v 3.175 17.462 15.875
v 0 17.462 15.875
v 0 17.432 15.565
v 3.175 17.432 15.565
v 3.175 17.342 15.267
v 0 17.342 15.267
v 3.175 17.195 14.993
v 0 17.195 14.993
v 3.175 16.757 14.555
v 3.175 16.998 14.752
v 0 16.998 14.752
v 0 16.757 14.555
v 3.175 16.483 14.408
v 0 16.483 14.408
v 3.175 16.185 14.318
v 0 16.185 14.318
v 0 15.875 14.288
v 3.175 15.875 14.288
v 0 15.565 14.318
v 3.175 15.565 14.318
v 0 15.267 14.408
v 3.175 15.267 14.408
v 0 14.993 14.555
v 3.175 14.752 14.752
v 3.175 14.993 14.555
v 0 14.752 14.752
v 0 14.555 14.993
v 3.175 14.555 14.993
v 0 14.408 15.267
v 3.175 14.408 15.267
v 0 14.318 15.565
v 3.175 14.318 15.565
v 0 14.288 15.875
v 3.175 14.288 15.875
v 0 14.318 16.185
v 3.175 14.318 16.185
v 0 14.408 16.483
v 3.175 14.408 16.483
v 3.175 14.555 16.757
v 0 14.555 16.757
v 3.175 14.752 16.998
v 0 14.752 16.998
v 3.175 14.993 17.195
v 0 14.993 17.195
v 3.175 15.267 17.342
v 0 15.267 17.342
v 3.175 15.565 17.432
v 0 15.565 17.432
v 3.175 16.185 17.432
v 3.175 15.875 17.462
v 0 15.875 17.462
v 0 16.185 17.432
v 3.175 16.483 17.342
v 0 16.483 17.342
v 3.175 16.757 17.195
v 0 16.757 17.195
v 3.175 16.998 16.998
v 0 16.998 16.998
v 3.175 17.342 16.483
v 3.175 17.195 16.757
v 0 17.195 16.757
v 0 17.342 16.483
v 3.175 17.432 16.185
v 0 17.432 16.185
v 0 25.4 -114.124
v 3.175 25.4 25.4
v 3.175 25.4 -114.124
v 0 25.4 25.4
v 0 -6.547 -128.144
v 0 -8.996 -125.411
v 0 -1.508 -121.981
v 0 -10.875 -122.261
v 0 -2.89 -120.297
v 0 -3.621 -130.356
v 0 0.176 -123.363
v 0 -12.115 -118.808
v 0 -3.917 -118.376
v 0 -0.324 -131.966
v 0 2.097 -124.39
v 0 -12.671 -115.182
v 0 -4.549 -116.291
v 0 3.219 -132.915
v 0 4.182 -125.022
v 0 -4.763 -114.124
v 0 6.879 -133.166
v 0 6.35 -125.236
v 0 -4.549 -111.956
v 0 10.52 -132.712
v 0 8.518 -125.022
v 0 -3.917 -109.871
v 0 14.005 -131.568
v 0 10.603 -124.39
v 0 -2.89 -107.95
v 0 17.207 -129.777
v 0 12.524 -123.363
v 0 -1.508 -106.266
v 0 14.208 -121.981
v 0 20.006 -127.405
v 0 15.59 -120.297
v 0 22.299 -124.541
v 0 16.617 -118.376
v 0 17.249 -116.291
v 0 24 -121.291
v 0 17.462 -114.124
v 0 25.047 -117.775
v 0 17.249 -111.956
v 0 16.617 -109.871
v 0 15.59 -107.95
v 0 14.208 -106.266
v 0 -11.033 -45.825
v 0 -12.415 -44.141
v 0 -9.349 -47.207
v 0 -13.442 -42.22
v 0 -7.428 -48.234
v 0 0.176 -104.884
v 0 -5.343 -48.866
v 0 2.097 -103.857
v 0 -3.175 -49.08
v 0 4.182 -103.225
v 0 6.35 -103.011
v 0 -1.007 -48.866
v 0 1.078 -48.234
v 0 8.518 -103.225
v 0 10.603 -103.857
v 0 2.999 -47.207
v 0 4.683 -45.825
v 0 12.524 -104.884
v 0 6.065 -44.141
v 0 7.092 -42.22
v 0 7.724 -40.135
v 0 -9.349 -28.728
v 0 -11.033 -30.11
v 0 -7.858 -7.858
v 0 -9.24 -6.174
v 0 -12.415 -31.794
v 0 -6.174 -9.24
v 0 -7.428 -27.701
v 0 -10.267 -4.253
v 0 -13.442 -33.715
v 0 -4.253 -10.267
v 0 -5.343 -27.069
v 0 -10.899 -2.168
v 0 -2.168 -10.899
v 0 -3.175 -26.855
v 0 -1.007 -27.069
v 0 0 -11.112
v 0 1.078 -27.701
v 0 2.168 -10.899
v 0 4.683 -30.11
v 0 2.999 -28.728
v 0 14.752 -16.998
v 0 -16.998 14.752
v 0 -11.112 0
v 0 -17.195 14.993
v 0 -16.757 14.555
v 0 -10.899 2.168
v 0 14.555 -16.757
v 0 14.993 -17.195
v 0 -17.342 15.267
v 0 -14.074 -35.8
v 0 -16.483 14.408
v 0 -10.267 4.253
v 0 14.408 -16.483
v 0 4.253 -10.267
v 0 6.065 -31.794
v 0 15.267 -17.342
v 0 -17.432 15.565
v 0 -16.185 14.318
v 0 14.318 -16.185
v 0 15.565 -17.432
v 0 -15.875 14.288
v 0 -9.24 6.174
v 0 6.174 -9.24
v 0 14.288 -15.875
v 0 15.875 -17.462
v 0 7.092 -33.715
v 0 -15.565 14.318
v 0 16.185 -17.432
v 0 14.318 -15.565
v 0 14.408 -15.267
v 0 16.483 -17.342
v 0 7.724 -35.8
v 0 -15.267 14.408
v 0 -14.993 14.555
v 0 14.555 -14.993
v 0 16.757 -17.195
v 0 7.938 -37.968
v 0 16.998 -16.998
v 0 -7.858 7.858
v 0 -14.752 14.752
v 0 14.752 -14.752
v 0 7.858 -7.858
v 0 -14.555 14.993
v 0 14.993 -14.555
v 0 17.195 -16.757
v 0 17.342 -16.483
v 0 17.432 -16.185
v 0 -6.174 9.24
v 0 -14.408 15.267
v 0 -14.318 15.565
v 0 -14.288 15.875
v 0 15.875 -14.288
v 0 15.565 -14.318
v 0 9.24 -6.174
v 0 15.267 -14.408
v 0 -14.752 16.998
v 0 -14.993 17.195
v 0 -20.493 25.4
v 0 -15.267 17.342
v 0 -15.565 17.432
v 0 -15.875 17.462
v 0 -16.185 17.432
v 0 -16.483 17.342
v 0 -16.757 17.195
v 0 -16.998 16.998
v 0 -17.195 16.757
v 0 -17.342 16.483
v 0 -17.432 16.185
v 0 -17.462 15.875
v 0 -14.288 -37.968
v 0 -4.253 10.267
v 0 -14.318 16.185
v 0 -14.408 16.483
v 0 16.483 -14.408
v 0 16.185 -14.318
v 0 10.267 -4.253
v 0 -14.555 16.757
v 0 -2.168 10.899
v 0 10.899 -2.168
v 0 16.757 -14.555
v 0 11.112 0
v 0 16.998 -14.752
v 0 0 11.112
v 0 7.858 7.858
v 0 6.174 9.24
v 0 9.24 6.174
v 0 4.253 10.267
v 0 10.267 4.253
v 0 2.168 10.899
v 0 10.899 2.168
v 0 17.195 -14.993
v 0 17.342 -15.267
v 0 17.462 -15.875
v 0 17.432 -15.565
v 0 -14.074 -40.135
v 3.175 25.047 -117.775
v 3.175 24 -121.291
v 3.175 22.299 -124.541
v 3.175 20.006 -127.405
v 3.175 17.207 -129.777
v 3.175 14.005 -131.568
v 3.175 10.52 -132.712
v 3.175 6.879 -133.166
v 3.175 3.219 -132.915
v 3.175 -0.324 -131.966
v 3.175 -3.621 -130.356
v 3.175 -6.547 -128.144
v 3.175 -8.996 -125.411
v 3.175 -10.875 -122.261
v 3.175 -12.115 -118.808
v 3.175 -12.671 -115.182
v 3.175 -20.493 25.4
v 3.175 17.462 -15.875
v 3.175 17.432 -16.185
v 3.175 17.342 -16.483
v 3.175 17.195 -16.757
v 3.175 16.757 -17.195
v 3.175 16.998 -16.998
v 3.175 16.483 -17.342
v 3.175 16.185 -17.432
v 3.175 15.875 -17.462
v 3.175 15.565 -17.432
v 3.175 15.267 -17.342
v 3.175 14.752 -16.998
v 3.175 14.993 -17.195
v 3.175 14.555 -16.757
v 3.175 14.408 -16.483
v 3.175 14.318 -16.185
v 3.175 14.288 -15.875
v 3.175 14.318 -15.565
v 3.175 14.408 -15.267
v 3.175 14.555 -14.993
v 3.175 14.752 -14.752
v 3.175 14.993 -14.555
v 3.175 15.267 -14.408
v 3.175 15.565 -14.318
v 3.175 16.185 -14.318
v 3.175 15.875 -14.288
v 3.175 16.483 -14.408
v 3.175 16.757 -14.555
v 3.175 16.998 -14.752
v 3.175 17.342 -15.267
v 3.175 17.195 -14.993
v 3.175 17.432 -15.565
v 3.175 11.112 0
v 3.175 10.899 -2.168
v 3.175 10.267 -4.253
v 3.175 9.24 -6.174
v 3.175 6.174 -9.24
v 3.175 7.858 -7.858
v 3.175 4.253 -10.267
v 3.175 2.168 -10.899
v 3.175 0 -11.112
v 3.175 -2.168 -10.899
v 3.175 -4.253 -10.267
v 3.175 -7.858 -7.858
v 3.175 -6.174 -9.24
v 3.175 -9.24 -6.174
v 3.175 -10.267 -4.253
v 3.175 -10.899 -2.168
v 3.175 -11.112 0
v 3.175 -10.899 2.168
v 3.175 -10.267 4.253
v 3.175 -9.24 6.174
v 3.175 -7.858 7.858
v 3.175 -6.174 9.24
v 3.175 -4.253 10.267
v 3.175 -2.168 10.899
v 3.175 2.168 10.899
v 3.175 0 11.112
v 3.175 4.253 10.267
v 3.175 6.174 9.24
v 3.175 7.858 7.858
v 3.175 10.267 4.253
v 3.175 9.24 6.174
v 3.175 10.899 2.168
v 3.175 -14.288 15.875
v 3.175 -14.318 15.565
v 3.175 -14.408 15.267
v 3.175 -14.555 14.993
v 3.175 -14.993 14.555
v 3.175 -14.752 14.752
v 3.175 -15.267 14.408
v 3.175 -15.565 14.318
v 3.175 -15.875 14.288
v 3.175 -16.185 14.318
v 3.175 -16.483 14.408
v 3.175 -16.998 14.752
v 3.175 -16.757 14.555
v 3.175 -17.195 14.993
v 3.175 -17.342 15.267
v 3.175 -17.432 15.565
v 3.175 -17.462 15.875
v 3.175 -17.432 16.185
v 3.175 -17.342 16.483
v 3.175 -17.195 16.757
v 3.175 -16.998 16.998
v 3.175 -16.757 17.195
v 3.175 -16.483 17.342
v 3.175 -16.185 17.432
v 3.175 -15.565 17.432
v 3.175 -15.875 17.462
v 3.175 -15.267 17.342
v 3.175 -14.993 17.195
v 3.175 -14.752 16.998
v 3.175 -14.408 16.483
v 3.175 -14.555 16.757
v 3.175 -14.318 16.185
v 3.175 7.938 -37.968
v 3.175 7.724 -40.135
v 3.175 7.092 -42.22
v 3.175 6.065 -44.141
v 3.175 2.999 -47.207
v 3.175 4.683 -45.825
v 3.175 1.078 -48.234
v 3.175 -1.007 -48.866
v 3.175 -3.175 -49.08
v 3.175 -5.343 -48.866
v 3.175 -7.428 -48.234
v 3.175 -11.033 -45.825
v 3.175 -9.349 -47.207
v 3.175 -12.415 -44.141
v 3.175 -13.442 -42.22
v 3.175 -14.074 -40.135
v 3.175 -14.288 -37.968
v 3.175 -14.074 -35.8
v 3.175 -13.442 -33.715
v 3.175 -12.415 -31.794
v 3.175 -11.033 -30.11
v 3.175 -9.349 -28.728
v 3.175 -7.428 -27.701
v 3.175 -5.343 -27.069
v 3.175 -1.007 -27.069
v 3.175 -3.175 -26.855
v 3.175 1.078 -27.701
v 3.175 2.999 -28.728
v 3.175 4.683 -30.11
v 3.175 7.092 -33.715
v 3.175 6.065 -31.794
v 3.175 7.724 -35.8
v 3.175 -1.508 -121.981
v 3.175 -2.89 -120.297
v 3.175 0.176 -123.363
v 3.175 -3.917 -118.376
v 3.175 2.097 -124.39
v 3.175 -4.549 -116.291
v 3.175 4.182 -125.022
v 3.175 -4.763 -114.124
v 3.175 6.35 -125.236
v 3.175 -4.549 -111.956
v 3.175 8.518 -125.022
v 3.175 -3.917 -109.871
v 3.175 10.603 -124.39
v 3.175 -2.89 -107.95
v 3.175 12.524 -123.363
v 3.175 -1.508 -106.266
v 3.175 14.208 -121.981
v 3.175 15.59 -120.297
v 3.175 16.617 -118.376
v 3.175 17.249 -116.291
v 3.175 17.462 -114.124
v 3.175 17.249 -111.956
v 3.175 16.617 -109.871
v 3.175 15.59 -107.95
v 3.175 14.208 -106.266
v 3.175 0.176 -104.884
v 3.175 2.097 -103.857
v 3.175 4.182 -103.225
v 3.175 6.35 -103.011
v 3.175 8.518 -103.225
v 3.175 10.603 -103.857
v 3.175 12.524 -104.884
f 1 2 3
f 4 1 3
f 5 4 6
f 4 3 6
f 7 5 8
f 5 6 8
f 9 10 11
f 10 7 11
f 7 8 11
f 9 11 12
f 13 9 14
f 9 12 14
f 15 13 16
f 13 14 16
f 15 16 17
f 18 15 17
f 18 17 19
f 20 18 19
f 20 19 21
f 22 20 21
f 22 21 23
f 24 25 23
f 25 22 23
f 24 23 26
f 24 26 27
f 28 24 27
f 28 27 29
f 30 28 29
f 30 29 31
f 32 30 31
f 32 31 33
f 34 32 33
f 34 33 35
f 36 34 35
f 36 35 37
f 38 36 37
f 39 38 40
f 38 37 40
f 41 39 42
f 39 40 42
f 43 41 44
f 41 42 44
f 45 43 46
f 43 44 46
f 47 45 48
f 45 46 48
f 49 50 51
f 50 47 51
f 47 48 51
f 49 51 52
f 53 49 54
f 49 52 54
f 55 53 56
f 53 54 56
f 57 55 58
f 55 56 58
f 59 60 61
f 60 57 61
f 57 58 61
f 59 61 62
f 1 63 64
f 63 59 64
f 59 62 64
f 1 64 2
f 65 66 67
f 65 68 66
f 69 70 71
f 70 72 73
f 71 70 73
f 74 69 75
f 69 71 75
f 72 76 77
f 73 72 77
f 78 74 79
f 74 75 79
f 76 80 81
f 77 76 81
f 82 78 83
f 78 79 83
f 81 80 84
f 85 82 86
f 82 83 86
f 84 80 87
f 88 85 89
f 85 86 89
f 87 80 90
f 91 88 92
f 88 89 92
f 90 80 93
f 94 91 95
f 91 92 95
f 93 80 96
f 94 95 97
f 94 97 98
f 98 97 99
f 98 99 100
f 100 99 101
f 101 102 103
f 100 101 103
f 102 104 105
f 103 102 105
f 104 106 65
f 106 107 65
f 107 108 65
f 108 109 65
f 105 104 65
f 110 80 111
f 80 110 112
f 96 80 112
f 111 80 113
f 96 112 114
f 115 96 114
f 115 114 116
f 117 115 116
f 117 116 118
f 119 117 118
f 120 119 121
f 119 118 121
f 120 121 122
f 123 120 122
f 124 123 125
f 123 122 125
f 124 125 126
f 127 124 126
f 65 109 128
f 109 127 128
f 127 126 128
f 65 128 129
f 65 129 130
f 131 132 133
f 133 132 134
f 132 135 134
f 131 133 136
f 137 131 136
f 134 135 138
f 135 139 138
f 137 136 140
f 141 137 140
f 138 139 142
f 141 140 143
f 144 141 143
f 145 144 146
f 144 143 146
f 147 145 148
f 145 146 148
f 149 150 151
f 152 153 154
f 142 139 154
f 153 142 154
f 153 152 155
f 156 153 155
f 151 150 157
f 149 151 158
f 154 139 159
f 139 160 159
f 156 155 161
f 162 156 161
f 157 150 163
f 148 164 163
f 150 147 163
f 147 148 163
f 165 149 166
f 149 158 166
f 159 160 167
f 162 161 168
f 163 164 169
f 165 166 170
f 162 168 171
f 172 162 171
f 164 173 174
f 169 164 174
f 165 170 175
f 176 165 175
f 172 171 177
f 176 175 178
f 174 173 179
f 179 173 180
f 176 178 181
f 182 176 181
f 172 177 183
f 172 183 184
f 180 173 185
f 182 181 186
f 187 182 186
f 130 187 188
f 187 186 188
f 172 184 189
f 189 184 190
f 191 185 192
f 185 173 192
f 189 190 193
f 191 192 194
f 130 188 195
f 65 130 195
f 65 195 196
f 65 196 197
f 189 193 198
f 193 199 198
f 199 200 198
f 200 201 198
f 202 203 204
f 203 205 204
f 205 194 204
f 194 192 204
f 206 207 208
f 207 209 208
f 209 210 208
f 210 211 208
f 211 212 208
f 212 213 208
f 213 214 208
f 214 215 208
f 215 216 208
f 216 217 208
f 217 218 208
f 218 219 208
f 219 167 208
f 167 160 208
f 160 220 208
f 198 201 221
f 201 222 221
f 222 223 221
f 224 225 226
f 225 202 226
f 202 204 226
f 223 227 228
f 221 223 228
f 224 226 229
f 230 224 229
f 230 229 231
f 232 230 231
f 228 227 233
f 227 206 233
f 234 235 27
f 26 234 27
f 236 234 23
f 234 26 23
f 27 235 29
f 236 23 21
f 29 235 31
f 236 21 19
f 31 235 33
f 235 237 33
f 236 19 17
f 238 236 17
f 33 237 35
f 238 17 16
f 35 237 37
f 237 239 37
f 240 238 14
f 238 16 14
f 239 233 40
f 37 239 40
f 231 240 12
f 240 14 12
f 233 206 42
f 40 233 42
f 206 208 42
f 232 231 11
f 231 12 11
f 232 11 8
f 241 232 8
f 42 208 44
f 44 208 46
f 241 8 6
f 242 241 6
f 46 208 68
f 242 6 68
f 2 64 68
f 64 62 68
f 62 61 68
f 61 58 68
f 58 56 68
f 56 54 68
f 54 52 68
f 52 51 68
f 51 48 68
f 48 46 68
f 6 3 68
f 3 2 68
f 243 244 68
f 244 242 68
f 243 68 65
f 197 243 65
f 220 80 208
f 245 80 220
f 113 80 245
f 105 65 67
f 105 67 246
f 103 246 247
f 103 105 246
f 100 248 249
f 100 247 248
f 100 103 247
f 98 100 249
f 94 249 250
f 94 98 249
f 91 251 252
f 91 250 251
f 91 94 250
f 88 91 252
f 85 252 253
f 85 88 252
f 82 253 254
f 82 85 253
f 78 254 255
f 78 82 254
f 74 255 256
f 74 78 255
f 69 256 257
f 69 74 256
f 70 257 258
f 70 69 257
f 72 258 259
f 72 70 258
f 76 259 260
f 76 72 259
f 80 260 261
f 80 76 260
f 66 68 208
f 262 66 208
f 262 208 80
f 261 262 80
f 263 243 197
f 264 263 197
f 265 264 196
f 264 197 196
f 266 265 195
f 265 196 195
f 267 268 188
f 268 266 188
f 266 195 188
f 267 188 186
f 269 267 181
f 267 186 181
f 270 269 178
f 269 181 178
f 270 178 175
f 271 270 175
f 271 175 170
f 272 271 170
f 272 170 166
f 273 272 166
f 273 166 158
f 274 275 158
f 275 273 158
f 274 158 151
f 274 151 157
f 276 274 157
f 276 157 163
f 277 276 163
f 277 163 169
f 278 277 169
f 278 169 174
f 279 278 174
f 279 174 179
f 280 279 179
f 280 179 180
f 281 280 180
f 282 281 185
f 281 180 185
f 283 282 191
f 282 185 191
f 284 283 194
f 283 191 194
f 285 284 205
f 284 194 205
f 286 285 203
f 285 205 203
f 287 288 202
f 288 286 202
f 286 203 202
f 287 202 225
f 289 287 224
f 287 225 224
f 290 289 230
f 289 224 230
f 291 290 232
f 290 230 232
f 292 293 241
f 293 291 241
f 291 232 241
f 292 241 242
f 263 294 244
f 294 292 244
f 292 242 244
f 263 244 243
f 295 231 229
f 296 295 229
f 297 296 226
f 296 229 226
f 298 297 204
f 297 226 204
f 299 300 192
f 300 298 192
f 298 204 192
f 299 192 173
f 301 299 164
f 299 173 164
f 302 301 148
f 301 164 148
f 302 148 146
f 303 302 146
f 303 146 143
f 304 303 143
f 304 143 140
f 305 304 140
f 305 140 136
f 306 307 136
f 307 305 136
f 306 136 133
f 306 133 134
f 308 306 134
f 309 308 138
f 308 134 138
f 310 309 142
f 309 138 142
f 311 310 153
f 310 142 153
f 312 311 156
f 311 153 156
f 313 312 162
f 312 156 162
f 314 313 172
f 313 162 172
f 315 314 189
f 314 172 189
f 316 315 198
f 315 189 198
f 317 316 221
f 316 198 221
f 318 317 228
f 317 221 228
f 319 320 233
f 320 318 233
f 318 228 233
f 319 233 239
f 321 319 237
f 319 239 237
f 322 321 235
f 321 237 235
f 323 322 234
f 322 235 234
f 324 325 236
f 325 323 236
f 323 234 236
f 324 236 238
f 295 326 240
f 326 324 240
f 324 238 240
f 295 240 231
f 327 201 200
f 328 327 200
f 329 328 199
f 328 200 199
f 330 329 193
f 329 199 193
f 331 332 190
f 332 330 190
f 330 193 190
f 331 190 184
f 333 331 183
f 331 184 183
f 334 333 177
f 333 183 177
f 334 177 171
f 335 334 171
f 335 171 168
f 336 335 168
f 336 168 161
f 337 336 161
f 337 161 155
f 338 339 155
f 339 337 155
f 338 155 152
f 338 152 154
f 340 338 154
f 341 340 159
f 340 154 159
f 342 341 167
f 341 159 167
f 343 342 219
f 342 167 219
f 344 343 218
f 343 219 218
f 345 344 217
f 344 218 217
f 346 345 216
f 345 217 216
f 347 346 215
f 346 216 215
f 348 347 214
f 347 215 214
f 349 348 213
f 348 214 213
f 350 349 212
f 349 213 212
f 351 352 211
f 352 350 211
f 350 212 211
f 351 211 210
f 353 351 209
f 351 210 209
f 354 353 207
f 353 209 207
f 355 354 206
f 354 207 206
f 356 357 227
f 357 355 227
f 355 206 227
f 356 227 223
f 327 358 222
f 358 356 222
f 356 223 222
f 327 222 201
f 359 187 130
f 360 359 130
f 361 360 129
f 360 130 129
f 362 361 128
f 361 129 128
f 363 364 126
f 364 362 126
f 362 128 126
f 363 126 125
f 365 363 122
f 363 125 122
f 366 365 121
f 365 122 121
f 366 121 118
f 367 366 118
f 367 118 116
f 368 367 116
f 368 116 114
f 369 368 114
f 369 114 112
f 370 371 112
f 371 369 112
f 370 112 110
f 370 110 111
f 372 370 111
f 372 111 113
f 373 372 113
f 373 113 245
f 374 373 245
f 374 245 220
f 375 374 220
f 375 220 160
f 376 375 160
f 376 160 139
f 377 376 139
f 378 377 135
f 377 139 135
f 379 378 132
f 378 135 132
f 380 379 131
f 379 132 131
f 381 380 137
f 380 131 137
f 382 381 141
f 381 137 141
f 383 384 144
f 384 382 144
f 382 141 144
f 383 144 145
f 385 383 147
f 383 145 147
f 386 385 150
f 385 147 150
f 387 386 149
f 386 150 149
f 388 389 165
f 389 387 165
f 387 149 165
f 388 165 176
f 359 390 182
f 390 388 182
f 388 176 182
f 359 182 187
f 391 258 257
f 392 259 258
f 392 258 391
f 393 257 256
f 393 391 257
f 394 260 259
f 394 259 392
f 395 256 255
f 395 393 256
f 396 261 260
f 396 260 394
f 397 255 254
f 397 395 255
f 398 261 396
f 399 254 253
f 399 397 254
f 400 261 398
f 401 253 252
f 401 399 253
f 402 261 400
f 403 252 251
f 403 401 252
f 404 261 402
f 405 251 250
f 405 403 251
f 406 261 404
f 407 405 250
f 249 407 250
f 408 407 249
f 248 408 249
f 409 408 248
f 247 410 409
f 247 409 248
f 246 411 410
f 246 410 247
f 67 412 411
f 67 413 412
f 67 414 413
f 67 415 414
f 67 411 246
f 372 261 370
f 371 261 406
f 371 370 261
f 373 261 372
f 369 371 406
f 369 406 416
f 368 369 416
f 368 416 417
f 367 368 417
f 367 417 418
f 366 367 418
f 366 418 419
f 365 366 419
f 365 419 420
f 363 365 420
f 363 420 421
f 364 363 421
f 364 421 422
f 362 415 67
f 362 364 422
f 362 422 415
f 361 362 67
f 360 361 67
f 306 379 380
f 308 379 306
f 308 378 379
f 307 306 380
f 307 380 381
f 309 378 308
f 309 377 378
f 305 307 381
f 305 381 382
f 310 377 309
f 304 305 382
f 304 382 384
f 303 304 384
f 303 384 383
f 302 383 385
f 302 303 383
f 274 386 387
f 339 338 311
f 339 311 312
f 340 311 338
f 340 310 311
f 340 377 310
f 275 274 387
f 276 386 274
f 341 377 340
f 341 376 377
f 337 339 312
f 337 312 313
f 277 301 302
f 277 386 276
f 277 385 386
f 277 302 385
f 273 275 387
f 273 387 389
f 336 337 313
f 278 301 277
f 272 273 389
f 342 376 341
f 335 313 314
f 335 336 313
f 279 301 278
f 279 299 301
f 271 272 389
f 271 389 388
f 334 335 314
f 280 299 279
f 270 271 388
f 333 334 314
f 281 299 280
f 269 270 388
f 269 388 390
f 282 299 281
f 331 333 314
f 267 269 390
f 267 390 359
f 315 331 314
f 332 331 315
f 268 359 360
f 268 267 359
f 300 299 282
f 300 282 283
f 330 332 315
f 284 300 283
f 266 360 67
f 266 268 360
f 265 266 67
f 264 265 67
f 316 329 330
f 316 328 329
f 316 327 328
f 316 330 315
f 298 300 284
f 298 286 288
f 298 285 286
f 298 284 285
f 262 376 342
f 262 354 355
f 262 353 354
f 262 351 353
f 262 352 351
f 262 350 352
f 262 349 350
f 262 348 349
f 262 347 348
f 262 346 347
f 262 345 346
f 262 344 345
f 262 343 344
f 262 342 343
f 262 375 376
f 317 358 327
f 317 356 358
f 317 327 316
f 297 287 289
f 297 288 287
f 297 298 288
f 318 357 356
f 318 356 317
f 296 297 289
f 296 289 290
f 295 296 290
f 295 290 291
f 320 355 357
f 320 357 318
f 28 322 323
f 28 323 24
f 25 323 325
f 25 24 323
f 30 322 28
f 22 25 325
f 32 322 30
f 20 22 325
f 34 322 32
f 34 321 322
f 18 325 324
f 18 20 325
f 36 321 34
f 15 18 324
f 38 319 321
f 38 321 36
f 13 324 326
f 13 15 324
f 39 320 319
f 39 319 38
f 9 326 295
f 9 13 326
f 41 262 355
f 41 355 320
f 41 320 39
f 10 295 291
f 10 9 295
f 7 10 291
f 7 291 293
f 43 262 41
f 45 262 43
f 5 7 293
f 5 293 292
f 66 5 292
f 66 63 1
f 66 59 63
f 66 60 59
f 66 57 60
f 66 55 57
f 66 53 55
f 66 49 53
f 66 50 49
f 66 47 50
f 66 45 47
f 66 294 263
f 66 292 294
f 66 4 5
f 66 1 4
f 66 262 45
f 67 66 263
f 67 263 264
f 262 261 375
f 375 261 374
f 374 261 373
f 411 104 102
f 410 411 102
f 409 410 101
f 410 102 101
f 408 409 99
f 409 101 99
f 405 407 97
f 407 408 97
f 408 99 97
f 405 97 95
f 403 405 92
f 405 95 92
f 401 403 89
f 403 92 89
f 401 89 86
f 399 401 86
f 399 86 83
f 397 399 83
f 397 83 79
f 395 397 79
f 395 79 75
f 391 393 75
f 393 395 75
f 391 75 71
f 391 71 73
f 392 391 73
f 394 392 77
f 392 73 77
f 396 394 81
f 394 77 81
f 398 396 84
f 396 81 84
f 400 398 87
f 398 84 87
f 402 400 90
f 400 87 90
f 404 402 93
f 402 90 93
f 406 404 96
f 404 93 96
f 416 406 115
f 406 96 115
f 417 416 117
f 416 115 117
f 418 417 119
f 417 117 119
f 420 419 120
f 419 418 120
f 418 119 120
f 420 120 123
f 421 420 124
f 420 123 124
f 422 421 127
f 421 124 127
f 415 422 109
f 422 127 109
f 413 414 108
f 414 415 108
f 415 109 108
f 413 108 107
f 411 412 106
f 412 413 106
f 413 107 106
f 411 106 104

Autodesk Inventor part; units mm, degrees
ref_plane "YZ Plane" through (0, 0, 0) normal (1, 0, 0) x (0, 1, 0)
ref_plane "XZ Plane" through (0, 0, 0) normal (0, 1, 0) x (-1, 0, 0)
ref_plane "XY Plane" through (0, 0, 0) normal (0, 0, 1) x (1, 0, 0)
sketch "Sketch1" plane through (0, 0, 0) normal (1, 0, 0) x (0, 1, 0)
  line L0 (25.4, 25.4) -> (25.4, -114.1235)
  arc A0 (-12.6706, -115.1818) -> (25.4, -114.1235) centre (6.35, -114.1235) ccw
  line L1 (-20.4928, 25.4) -> (-12.6706, -115.1818)
  circle A1 centre (0, 0) radius 11.1125
  circle A2 centre (6.35, -114.1235) radius 11.1125
  line L2 (6.35, -114.1235) -> (0, 0) construction
  line L3 (25.4, 25.4) -> (-20.4928, 25.4)
  circle A3 centre (-3.175, -37.9675) radius 11.1125
  circle A4 centre (6.35, -114.1235) radius 9.525 construction
  circle A5 centre (6.35, -114.1235) radius 15.875 construction
  line L4 (15.875, -15.875) -> (15.875, 15.875) construction
  line L5 (15.875, 15.875) -> (-15.875, 15.875) construction
  circle A6 centre (15.875, 15.875) radius 1.5875
  circle A7 centre (-15.875, 15.875) radius 1.5875
  circle A8 centre (15.875, -15.875) radius 1.5875
  point P0 (6.8794, -133.1661)
  dimension "d1" = 114.3
  dimension "d2" = 6.35
  dimension "d3" = 22.225
  dimension "d9" = 25.4
  dimension "d10" = 25.4
  dimension "d11" = 19.05
  dimension "d12" = 38.1
  dimension "d13" = 3.175
  dimension "d14" = 19.05
  dimension "d15" = 6.35
  dimension "d25" = 3.175
  dimension "d26" = 9.525
  dimension "d27" = 9.525
  dimension "d28" = 31.75
extrude "Extrusion1" add sketch "Sketch1" along normal blind 3.175
properties part number "Hopper pully plate"
